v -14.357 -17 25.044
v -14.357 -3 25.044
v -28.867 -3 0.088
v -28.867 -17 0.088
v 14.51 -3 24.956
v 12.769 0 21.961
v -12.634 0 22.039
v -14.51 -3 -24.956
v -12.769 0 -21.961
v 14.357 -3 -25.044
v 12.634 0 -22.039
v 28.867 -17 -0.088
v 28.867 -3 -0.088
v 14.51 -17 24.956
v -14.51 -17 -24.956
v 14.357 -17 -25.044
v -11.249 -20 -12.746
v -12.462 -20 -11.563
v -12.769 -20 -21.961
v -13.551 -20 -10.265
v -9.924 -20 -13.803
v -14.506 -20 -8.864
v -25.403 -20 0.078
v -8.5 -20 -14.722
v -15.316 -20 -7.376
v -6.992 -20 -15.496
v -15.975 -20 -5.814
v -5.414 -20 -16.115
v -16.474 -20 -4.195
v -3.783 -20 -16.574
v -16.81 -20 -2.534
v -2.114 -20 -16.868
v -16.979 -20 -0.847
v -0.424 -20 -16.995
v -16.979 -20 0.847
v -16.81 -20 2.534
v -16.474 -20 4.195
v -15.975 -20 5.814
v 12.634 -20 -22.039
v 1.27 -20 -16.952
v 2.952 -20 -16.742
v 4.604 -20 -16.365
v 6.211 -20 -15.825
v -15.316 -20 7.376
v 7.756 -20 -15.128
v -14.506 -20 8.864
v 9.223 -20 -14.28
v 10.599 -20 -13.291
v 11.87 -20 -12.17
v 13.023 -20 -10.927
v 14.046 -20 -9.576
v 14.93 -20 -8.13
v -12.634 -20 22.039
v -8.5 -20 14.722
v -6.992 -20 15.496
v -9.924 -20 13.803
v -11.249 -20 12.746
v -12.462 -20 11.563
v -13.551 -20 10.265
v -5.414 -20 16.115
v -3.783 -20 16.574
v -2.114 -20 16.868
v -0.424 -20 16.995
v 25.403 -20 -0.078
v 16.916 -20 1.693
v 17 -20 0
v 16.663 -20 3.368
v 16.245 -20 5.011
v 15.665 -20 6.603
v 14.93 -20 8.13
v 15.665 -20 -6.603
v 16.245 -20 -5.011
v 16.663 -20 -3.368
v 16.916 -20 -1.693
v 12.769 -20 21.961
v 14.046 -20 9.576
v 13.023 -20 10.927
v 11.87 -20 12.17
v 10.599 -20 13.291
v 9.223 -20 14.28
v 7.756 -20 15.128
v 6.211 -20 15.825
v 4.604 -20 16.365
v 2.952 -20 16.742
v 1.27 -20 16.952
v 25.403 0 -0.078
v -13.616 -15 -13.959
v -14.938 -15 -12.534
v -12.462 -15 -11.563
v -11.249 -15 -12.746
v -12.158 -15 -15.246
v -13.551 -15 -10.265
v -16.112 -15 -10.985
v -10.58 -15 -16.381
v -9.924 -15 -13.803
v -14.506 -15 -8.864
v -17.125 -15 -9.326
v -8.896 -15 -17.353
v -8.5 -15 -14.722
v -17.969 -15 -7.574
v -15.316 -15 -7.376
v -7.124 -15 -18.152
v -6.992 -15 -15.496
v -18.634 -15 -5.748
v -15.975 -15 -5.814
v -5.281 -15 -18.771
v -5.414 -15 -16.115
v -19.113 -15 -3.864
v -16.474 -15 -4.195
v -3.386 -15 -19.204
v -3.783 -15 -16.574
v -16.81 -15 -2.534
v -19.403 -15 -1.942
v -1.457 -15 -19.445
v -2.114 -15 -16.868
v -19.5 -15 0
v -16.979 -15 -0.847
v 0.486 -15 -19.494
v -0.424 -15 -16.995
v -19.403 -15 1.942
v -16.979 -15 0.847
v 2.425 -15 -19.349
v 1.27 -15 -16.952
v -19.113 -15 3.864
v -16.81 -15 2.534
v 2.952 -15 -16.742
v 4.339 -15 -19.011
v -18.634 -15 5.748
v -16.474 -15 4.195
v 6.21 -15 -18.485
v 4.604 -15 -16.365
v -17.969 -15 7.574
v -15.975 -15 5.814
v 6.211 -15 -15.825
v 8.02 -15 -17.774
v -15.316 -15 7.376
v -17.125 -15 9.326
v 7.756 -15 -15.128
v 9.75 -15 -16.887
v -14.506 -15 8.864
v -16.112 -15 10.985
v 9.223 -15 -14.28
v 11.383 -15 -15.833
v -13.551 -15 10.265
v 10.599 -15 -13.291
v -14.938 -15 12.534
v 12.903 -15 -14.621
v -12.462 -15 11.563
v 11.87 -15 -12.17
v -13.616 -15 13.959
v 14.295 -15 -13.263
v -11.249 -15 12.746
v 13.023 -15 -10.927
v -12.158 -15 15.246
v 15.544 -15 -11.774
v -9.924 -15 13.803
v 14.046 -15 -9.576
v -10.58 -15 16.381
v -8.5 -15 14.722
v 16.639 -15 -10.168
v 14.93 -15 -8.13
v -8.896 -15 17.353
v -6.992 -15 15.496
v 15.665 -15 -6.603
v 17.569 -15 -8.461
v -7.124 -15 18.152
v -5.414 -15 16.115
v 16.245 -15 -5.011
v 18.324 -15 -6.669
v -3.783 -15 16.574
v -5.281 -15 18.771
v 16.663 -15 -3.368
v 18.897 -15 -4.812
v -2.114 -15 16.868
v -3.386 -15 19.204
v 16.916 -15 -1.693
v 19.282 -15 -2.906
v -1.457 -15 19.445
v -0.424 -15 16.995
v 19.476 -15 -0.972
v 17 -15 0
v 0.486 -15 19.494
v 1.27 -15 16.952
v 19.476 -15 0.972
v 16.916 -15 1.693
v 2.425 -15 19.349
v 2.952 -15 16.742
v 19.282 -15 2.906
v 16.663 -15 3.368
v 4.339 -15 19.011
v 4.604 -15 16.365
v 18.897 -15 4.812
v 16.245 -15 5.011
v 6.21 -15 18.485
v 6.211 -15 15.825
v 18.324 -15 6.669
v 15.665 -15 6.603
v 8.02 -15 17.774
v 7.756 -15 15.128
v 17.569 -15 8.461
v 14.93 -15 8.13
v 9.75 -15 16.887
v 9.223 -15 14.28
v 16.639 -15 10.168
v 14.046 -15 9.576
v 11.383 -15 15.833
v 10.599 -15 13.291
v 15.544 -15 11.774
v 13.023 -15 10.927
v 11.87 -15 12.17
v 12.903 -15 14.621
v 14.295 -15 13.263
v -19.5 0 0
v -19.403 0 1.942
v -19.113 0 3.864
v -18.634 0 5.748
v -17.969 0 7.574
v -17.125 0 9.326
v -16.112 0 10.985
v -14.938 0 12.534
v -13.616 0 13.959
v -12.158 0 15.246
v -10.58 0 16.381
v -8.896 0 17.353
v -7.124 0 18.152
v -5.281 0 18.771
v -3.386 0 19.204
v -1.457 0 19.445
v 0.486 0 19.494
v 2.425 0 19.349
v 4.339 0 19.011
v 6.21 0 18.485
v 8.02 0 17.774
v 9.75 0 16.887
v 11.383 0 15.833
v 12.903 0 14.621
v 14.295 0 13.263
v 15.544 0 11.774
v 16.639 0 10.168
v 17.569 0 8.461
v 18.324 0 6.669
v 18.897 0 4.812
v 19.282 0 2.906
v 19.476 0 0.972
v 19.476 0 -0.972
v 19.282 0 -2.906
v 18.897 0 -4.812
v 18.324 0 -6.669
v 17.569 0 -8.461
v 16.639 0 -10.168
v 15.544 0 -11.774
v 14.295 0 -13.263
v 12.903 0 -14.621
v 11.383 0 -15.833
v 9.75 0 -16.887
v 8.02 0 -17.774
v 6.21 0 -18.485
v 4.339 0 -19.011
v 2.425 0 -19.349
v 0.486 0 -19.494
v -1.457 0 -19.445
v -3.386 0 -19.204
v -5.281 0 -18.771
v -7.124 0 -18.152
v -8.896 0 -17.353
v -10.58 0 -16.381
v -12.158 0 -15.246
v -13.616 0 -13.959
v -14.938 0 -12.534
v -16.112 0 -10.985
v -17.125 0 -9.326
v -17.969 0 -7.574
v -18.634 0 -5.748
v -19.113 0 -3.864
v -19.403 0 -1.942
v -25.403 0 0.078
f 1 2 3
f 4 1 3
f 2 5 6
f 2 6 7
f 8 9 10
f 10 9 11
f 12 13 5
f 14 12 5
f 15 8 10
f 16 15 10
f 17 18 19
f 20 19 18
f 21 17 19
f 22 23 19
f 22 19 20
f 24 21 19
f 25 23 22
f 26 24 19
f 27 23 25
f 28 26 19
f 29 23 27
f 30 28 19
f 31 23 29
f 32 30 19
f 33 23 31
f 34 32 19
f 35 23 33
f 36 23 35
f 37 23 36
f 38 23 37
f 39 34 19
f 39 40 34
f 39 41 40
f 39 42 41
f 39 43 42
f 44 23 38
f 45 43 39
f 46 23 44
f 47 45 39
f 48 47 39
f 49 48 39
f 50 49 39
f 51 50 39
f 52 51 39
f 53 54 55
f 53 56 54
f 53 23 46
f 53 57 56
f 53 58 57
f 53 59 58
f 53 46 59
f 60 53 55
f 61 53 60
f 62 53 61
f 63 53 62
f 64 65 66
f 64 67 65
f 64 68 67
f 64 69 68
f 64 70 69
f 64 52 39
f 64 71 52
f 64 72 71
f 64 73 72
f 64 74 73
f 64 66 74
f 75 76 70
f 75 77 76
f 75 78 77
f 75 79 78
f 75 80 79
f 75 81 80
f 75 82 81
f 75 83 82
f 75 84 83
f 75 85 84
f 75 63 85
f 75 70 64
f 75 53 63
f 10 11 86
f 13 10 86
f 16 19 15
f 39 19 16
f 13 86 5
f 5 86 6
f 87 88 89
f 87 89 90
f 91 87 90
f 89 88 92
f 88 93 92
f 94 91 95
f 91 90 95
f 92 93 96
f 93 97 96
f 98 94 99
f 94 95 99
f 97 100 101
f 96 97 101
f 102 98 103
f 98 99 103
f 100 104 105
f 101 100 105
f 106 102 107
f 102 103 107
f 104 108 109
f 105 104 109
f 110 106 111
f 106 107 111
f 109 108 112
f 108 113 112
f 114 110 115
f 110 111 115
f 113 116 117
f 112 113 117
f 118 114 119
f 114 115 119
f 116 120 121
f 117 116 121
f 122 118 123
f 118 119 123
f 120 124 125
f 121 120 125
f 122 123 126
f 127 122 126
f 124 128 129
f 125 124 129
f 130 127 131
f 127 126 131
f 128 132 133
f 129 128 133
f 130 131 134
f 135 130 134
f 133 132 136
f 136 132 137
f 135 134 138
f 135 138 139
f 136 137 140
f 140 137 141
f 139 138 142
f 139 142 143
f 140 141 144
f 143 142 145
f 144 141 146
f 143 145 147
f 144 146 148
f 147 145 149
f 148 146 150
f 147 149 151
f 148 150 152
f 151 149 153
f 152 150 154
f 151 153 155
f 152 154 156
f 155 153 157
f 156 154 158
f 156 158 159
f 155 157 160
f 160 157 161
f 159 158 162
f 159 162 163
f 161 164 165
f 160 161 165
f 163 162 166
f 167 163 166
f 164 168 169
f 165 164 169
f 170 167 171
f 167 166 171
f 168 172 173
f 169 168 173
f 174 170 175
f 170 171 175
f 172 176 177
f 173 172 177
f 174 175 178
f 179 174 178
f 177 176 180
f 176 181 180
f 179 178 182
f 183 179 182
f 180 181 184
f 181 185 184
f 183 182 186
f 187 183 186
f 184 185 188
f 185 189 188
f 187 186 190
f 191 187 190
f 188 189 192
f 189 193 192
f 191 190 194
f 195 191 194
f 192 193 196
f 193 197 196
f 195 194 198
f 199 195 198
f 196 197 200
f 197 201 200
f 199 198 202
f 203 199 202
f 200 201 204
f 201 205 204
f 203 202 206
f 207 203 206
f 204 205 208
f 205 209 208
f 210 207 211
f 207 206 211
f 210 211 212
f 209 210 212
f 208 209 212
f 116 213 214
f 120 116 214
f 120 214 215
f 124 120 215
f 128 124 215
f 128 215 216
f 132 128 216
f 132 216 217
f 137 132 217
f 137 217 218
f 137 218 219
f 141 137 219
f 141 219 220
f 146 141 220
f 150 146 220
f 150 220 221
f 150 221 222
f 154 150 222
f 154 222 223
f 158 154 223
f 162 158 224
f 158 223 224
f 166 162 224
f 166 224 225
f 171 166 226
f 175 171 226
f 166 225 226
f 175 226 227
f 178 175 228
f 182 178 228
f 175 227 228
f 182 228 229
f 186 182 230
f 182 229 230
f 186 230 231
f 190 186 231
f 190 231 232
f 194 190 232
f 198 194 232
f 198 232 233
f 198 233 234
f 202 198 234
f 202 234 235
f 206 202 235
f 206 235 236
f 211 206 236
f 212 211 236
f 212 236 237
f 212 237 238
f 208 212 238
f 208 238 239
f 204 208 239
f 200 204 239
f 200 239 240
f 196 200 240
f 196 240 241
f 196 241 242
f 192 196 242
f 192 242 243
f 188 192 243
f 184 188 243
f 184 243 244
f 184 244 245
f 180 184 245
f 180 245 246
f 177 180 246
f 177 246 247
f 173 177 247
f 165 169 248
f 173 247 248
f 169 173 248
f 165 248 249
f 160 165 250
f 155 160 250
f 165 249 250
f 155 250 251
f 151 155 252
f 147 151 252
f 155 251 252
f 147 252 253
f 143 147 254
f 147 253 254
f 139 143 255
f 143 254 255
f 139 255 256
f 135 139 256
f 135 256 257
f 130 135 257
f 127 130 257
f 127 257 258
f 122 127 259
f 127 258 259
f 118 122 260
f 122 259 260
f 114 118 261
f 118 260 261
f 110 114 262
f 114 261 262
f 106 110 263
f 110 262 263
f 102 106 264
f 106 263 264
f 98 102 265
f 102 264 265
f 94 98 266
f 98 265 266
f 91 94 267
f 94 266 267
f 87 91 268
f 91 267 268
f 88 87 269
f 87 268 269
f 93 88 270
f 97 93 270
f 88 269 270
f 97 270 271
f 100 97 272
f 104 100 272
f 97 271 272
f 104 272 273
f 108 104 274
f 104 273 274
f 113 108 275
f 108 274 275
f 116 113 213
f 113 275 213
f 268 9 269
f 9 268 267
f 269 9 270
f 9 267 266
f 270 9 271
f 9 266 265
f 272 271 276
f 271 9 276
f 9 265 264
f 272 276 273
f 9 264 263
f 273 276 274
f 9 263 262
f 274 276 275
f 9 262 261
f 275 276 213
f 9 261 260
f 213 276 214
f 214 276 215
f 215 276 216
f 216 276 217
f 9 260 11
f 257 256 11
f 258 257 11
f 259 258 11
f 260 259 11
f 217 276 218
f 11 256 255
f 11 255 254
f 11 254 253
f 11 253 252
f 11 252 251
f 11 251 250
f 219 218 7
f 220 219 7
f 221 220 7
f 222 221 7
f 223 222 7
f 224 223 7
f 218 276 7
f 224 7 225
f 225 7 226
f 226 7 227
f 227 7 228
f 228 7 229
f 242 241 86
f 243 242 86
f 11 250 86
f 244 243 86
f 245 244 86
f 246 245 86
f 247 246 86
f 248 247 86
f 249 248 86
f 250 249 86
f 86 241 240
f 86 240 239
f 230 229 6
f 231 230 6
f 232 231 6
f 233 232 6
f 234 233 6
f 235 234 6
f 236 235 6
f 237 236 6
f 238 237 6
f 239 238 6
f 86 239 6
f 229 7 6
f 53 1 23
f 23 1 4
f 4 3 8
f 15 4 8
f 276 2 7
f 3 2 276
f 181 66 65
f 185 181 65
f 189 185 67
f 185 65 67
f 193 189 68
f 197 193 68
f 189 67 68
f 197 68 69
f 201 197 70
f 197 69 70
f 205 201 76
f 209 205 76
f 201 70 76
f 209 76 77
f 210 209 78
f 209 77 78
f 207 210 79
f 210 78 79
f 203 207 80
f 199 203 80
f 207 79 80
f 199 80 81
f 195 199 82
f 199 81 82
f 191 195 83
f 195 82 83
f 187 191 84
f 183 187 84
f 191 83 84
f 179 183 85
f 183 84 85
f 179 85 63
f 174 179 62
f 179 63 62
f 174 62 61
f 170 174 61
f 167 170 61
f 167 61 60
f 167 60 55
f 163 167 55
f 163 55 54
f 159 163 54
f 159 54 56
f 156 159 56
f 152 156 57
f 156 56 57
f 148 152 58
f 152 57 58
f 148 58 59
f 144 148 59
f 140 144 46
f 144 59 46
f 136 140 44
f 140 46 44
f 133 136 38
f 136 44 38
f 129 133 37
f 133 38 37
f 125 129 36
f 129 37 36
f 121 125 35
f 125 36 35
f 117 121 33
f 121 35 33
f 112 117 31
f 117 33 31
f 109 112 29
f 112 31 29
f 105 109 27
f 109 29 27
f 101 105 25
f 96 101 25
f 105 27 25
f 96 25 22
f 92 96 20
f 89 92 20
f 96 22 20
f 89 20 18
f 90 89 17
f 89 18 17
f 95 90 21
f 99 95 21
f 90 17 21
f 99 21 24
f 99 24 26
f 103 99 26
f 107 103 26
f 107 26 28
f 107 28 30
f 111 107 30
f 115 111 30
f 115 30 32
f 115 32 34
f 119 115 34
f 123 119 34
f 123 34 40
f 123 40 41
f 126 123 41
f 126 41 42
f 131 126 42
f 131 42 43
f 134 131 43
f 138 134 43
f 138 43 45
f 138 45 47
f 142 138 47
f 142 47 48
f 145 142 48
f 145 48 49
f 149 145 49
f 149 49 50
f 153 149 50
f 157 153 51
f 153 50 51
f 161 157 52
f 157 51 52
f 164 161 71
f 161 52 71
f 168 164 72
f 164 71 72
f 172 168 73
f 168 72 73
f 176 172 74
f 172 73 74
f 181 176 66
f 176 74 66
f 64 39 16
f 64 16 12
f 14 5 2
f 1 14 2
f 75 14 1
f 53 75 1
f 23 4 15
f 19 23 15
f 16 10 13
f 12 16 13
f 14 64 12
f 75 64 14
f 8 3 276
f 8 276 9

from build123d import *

# Parameters (mm, degrees)
F1_DEPTH = 20
F3_D     = 39
F4_SIZE  = 3
F5_R     = 19.5
F5_R_2   = 17
F6_DEPTH = 5


with BuildPart() as f1:
    # F0 (on Front) → F1 (new body)
    with BuildSketch(Plane.XZ):
        Polygon((14.35727, -25.044004), (28.867379, -0.088241), (14.510108, 24.955763), (-14.35727, 25.044004), (-28.867379, 0.088241), (-14.510108, -24.955763), align=None)
    extrude(amount=F1_DEPTH)

    # F3 (through all)
    with Locations(Plane.XZ.offset(20)):
        with Locations((0, 0)):
            Hole(F3_D / 2)

    # F4
    f4_edges = [f1.edges().sort_by_distance(p)[0] for p in [
        (-21.612324, -20, 12.566122),
        (0.076419, -20, 24.999883),
        (21.688743, -20, 12.433761),
        (21.612324, -20, -12.566122),
        (-0.076419, -20, -24.999883),
        (-21.688743, -20, -12.433761),
        (21.688743, 0, 12.433761),
        (21.612324, 0, -12.566122),
        (-0.076419, 0, -24.999883),
        (-21.688743, 0, -12.433761),
        (-21.612324, 0, 12.566122),
        (0.076419, 0, 24.999883),
    ]]
    chamfer(f4_edges, length=F4_SIZE)

    # F5 (on face) → F6 (join)
    with BuildSketch(Plane.XZ.offset(20)):
        Circle(F5_R)
        Circle(F5_R_2, mode=Mode.SUBTRACT)
    extrude(amount=-F6_DEPTH)


solid = f1.part
